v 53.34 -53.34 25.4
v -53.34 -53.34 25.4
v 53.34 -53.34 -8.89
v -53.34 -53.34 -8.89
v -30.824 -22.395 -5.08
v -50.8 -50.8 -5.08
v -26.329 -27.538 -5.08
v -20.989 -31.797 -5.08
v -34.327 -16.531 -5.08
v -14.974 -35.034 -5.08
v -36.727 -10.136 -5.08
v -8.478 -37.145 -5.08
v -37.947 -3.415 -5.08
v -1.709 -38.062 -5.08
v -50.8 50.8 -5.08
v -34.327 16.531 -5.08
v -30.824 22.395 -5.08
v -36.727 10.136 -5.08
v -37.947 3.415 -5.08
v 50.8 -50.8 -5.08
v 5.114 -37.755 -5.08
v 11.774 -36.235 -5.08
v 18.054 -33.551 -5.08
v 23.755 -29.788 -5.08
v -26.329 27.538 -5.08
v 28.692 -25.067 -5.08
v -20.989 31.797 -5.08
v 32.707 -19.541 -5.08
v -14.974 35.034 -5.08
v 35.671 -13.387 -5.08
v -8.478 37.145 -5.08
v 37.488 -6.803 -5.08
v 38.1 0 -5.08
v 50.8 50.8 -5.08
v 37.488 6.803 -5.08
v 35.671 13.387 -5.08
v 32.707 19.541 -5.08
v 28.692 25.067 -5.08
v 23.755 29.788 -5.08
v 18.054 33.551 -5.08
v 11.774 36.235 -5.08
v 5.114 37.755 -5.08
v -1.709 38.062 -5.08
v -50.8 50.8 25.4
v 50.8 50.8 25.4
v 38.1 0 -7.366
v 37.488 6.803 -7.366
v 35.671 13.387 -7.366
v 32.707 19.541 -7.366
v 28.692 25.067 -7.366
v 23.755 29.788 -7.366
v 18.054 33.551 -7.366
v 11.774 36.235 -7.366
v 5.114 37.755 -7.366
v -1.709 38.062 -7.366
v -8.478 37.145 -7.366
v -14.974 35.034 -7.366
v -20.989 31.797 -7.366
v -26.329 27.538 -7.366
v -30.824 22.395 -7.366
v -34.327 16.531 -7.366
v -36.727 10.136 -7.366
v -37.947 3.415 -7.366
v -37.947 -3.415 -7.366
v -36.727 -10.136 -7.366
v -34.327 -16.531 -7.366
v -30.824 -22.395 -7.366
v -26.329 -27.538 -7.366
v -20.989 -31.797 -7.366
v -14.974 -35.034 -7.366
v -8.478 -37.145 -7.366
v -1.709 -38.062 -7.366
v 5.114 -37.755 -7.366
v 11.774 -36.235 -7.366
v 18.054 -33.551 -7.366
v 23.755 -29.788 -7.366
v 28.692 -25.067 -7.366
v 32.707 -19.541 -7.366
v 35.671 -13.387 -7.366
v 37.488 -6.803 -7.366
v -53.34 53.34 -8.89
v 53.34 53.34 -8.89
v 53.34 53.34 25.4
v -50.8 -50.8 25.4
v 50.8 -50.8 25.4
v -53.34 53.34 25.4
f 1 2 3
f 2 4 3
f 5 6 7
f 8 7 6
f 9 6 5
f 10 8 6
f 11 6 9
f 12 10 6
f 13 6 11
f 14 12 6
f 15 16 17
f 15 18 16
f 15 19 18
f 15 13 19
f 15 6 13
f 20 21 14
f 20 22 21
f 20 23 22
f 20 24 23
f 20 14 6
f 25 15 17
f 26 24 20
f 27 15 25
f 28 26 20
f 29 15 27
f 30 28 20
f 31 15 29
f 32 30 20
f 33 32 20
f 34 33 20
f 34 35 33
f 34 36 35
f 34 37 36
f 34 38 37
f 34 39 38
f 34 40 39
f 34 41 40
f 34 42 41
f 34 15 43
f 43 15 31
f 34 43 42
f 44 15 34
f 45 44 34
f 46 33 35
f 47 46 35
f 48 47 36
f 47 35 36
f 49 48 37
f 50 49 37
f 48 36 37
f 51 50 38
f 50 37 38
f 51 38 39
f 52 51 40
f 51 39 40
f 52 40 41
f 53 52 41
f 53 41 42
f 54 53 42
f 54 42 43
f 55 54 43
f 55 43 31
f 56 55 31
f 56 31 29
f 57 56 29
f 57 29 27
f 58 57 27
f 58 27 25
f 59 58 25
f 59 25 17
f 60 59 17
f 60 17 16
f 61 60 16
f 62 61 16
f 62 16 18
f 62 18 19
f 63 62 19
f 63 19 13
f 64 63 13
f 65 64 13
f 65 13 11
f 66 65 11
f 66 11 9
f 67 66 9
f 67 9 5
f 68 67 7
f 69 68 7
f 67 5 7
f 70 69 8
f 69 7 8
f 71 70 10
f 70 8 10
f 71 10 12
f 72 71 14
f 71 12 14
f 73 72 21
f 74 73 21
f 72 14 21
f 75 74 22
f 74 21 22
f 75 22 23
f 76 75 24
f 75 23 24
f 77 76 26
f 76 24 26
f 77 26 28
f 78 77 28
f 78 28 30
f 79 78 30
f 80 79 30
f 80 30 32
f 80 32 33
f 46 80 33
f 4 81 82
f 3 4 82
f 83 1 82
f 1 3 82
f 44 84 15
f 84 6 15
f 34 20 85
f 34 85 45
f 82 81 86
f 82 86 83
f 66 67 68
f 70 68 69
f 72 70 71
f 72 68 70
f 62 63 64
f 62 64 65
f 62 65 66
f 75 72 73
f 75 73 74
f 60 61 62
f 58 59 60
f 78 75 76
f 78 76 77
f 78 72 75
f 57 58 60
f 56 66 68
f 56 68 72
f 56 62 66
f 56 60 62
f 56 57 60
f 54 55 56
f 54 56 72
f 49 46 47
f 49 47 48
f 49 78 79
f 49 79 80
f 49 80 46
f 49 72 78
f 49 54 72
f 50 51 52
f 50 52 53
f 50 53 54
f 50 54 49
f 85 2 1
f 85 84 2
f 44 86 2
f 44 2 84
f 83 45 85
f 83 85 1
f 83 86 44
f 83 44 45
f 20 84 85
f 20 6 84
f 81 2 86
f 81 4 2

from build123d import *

# Parameters (mm, degrees)
F0_W        = 106.68
F0_H        = 106.68
F0_W_2      = 101.6
F0_H_2      = 101.6
F0_R        = 38.1
F1_DEPTH    = 8.89
F2_DEPTH    = 5.08
F3_DEPTH    = 7.366
F2_FACE_W   = 106.68
F2_FACE_H   = 106.68
F2_FACE_W_2 = 101.6
F2_FACE_H_2 = 101.6
F4_DEPTH    = 25.4


with BuildPart() as f1:
    # F0 (on Top) → F1 (new body)
    with BuildSketch(Plane.XY):
        Rectangle(F0_W, F0_H)
        Rectangle(F0_W_2, F0_H_2, mode=Mode.SUBTRACT)
        Rectangle(F0_W_2, F0_H_2)
        Circle(F0_R, mode=Mode.SUBTRACT)
        Circle(F0_R)
    extrude(amount=-F1_DEPTH)

    # F0 (on Top) → F2 (cut)
    with BuildSketch(Plane.XY):
        Rectangle(F0_W_2, F0_H_2)
        Circle(F0_R, mode=Mode.SUBTRACT)
    extrude(amount=-F2_DEPTH, mode=Mode.SUBTRACT)

    # F0 (on Top) → F3 (cut)
    with BuildSketch(Plane.XY):
        Circle(F0_R)
    extrude(amount=-F3_DEPTH, mode=Mode.SUBTRACT)

    # F2_face (on face) → F4 (join)
    with BuildSketch(Plane.XY):
        Rectangle(F2_FACE_W, F2_FACE_H)
        Rectangle(F2_FACE_W_2, F2_FACE_H_2, mode=Mode.SUBTRACT)
    extrude(amount=F4_DEPTH)


solid = f1.part
